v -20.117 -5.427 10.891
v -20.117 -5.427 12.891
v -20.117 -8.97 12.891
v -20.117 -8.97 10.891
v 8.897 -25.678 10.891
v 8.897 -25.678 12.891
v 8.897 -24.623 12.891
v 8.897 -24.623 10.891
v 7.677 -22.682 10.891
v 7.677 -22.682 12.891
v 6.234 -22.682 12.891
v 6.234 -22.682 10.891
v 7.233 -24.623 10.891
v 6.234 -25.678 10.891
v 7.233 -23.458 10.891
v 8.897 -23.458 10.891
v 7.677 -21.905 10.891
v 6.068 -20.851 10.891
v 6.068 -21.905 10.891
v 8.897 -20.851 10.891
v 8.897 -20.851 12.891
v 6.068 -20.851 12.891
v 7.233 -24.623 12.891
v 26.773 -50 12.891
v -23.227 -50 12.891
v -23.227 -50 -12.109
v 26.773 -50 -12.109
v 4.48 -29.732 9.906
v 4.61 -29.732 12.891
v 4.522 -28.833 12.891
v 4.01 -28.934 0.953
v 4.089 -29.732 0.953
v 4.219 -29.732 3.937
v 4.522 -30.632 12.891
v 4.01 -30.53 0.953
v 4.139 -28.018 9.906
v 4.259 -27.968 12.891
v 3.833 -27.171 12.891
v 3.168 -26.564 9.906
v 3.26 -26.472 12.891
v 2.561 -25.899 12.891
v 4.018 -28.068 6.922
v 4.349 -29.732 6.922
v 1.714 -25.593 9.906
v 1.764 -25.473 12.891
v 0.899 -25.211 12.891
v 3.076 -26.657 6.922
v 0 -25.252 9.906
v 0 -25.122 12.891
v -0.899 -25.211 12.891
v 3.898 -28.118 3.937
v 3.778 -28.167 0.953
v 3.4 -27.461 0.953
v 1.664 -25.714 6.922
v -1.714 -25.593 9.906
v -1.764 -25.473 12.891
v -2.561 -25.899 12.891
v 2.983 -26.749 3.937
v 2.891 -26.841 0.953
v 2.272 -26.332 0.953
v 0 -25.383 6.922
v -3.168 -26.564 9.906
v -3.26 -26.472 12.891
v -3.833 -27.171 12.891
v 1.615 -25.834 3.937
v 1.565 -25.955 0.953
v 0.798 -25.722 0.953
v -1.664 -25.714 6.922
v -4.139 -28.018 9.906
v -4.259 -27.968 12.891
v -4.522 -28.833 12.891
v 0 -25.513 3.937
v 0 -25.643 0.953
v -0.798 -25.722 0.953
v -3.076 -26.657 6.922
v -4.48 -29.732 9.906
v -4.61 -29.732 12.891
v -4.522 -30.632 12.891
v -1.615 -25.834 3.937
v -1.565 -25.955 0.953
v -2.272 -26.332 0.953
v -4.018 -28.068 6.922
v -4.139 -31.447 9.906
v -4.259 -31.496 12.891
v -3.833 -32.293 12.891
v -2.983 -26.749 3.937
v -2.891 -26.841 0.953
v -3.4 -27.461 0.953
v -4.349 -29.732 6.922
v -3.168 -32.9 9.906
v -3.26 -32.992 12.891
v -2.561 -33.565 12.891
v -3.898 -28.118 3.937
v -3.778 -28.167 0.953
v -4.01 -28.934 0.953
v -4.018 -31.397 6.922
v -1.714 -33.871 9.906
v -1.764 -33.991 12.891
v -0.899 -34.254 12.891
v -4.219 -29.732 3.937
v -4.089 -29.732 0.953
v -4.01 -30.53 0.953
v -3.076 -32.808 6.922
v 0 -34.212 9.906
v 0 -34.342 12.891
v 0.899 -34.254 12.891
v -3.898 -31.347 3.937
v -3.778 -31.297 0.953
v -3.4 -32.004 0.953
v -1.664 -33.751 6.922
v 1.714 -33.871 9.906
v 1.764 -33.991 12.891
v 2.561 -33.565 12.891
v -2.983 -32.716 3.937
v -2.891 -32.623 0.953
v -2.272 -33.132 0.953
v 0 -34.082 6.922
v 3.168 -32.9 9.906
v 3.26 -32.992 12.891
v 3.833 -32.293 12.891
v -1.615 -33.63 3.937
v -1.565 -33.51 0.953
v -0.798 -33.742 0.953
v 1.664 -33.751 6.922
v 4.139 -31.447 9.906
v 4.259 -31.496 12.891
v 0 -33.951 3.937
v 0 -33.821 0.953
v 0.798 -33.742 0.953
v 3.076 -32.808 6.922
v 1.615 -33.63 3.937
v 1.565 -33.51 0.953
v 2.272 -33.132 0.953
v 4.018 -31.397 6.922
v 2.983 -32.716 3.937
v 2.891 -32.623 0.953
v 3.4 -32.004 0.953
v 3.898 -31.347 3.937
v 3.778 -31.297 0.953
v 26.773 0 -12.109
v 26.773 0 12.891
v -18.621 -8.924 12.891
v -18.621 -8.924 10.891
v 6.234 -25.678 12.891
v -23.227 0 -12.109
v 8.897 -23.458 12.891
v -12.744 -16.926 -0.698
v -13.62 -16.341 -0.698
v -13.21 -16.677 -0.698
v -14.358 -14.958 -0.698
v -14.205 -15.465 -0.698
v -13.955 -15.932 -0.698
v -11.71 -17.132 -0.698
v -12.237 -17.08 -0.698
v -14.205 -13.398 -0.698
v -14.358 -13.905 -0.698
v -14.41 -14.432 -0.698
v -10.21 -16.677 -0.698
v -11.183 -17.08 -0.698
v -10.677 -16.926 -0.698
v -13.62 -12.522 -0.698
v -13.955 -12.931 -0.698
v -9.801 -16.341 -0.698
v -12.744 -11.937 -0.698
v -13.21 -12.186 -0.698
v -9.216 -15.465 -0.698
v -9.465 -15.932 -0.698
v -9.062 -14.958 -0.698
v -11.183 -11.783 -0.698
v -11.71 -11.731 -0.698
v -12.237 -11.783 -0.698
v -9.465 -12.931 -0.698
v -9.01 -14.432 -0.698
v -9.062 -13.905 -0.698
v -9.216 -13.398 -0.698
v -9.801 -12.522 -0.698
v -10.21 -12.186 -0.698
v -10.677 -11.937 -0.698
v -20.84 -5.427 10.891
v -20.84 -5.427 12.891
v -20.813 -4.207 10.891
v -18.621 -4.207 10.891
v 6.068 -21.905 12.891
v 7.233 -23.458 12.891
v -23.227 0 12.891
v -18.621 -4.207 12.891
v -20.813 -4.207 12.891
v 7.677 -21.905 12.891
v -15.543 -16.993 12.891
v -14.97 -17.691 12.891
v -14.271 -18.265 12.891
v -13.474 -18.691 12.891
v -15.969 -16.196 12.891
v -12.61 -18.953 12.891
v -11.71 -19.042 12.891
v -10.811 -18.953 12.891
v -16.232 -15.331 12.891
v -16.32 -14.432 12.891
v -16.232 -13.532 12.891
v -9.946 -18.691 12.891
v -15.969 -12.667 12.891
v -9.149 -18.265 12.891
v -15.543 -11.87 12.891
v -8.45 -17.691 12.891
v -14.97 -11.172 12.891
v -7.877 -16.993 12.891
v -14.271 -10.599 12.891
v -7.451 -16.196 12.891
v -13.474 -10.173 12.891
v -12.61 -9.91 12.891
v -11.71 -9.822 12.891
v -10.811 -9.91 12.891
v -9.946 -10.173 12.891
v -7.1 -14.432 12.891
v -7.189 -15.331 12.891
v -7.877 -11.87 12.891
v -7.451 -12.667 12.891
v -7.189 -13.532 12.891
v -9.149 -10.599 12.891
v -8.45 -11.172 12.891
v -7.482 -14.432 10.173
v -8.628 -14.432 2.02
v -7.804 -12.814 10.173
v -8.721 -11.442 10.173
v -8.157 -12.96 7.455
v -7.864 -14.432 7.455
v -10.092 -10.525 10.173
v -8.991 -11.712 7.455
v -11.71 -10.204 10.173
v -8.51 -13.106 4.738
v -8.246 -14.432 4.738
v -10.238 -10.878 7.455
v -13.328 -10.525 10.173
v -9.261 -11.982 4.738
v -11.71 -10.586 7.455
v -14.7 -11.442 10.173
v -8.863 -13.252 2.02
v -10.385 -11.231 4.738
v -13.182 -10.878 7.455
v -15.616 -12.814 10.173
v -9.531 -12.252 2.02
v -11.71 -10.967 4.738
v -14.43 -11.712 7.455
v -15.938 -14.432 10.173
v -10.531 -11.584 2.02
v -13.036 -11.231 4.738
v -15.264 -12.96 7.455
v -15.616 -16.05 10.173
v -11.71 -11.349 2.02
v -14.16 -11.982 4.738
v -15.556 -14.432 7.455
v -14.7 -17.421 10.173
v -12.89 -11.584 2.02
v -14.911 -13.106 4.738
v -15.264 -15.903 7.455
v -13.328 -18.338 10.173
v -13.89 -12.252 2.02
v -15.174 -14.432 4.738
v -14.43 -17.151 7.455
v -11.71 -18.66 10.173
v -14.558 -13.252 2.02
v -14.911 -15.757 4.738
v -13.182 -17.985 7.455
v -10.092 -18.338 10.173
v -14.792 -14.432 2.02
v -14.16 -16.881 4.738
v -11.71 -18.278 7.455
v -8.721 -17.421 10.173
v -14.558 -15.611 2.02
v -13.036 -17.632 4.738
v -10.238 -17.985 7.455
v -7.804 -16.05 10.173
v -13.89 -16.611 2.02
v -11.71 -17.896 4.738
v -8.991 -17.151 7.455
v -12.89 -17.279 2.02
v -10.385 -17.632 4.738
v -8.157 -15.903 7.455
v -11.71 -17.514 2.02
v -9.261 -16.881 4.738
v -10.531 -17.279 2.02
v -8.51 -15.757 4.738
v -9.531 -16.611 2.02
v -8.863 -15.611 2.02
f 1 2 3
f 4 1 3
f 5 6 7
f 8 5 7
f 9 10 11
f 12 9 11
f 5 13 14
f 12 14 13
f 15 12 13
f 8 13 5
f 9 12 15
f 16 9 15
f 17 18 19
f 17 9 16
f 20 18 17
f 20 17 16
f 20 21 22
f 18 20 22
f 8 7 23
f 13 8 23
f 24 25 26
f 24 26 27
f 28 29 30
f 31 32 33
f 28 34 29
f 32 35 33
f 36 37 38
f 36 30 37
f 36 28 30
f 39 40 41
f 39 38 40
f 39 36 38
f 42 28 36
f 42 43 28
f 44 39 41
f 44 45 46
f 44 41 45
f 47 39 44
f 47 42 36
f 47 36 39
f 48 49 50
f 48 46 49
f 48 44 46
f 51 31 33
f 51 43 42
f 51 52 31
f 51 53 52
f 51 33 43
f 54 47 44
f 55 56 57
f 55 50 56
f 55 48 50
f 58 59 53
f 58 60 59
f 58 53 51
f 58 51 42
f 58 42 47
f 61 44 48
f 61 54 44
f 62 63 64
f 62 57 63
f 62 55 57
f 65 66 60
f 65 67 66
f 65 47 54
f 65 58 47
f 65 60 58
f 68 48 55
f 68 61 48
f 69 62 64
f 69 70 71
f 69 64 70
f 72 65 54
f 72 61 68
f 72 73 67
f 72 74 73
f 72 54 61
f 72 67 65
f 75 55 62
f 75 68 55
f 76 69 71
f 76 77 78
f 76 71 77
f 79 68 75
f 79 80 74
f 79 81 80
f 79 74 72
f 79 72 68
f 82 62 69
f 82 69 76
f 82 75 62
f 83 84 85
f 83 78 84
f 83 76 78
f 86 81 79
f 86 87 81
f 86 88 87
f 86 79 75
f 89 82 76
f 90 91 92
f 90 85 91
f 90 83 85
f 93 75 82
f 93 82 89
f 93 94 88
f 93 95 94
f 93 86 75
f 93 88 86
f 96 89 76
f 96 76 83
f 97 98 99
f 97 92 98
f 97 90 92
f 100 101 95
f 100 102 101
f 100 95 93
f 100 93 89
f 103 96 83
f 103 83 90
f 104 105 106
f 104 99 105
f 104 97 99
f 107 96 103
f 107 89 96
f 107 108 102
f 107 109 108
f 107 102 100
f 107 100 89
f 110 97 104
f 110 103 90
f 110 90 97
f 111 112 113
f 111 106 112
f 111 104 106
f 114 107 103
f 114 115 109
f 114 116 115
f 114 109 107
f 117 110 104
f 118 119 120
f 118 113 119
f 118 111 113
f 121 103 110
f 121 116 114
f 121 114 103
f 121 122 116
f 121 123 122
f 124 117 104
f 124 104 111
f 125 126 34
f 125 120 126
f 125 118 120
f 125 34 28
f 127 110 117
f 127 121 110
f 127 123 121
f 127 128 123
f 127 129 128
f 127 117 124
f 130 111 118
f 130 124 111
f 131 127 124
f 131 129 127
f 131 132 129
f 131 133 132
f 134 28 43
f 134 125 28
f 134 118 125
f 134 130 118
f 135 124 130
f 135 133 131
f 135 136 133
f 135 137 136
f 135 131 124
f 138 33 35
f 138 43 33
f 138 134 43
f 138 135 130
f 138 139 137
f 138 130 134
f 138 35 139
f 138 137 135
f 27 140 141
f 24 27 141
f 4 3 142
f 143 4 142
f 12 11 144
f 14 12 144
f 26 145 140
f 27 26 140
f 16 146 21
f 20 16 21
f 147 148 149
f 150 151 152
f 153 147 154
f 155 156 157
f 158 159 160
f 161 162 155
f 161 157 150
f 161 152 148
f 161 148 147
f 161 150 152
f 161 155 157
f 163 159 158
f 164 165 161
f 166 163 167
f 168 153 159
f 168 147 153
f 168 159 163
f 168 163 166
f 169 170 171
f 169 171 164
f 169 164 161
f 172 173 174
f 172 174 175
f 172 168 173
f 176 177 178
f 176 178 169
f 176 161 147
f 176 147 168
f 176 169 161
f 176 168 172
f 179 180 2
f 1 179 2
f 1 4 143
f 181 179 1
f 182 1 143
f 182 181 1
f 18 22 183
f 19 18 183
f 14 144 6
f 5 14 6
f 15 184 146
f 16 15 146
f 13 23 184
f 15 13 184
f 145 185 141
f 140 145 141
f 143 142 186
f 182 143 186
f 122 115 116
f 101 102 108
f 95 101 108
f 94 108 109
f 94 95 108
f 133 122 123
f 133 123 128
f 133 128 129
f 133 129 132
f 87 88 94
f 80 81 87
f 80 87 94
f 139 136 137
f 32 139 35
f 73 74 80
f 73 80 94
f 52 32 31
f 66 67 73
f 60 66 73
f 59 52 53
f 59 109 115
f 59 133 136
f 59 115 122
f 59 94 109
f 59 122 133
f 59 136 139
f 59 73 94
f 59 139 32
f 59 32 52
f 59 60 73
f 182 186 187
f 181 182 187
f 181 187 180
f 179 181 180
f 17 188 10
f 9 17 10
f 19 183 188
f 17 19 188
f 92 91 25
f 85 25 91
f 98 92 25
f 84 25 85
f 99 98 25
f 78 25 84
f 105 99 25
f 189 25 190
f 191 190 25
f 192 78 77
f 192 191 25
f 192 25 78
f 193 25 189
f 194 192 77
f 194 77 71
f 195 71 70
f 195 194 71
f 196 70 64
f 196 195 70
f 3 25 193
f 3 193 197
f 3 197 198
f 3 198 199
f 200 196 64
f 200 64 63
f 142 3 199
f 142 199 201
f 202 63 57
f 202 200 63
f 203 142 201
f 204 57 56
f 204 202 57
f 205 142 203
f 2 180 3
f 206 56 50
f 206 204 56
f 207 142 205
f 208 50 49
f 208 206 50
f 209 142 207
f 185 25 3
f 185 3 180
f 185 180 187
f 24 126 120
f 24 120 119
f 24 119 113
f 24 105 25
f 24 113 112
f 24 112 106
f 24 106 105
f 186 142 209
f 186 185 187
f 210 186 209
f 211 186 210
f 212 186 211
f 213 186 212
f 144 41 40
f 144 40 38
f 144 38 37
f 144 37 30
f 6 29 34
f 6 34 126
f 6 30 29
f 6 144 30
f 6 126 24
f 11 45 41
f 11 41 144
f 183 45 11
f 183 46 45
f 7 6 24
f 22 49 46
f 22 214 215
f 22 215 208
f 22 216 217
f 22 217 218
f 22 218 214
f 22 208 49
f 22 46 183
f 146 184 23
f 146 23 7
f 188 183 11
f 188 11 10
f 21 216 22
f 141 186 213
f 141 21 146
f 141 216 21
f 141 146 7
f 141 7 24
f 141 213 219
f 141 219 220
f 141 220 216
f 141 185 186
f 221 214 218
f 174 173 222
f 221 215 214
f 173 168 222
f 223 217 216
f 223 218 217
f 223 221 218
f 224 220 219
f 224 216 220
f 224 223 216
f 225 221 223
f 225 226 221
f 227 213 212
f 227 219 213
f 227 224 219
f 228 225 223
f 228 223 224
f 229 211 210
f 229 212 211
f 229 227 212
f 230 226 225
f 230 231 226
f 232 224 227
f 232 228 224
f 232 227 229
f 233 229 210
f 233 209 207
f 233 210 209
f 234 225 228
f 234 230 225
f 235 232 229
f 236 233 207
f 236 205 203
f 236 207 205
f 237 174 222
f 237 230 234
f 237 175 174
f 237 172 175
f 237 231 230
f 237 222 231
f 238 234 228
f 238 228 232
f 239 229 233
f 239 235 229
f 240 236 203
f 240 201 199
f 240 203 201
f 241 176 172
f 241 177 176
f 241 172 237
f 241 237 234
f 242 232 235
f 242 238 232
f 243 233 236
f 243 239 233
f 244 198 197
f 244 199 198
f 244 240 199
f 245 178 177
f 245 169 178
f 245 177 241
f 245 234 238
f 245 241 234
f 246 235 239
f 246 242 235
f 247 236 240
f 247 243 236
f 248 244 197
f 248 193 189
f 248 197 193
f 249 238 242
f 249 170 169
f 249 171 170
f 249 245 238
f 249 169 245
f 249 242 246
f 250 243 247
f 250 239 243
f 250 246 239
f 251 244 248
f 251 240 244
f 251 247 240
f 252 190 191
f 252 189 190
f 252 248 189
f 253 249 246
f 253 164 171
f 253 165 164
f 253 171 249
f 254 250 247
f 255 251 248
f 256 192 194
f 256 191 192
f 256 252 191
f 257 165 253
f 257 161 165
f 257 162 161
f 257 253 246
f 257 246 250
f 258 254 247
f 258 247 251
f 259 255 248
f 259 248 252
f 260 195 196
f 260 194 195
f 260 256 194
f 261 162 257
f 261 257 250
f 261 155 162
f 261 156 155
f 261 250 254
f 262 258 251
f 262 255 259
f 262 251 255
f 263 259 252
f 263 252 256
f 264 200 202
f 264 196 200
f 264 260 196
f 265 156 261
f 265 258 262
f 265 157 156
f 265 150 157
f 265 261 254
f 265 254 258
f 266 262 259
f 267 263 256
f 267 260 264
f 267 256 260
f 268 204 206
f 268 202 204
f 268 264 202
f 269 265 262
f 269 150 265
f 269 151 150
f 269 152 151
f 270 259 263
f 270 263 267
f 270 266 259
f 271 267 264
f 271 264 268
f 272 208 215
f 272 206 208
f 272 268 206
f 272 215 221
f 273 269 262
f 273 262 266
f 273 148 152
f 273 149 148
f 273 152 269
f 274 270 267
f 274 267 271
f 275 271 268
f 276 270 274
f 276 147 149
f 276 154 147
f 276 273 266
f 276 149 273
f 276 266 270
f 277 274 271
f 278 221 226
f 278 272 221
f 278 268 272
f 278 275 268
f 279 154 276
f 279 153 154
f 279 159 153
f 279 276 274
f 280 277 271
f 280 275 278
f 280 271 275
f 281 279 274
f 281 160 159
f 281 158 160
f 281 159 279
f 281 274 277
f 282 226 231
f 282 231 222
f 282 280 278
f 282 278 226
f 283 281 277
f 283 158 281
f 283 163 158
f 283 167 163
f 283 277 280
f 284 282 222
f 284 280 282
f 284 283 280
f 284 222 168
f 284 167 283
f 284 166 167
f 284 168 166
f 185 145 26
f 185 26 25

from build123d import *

# Parameters (mm, degrees)
F0_W     = 50
F0_H     = 25
F1_DEPTH = 50
F2_R     = 4.6101
F3_DEPTH = 11.938
F3_TAPER = 2.5
F4_R     = 4.61
F5_DEPTH = 13.589
F5_TAPER = 8
F7_DEPTH = 2


with BuildPart() as f1:
    # F0 (on Front) → F1 (new body)
    with BuildSketch(Plane.XZ):
        with Locations((1.772807911, 0.3909162391)):
            Rectangle(F0_W, F0_H)
    extrude(amount=F1_DEPTH)

    # F2 (on face) → F3 (cut)
    with BuildSketch(Plane.XY.offset(12.8909162391)):
        with Locations((0, -29.7321814987)):
            Circle(F2_R)
    extrude(amount=-F3_DEPTH, taper=F3_TAPER, mode=Mode.SUBTRACT)

    # F4 (on face) → F5 (cut)
    with BuildSketch(Plane.XY.offset(12.8909162391)):
        with Locations((-11.7101902142, -14.4315985963)):
            Circle(F4_R)
    extrude(amount=-F5_DEPTH, taper=F5_TAPER, mode=Mode.SUBTRACT)

    # F6 (on face) → F7 (cut)
    with BuildSketch(Plane.XY.offset(12.8909162391)):
        Polygon((-20.116565749, -5.4274424911), (-20.116565749, -8.9698005468), (-18.6207834631, -8.9243609875), (-18.6207834631, -5.4274424911), (-18.6207834631, -4.2068846524), (-20.8131559193, -4.2068846524), (-20.8399798721, -5.4274424911), align=None)
        Polygon((8.8972449303, -23.4584081918), (8.8972449303, -21.9049714506), (8.8972449303, -20.8508521318), (6.0677705333, -20.8508521318), (6.0677705333, -21.9049714506), (7.6766866259, -21.9049714506), (7.6766866259, -22.6816888899), (6.2342090532, -22.6816888899), (6.2342090532, -25.6776046008), (8.8972449303, -25.6776046008), (8.8972449303, -24.6234852821), (7.2328480892, -24.6234852821), (7.2328480892, -23.4584081918), align=None)
    extrude(amount=-F7_DEPTH, mode=Mode.SUBTRACT)


solid = f1.part
